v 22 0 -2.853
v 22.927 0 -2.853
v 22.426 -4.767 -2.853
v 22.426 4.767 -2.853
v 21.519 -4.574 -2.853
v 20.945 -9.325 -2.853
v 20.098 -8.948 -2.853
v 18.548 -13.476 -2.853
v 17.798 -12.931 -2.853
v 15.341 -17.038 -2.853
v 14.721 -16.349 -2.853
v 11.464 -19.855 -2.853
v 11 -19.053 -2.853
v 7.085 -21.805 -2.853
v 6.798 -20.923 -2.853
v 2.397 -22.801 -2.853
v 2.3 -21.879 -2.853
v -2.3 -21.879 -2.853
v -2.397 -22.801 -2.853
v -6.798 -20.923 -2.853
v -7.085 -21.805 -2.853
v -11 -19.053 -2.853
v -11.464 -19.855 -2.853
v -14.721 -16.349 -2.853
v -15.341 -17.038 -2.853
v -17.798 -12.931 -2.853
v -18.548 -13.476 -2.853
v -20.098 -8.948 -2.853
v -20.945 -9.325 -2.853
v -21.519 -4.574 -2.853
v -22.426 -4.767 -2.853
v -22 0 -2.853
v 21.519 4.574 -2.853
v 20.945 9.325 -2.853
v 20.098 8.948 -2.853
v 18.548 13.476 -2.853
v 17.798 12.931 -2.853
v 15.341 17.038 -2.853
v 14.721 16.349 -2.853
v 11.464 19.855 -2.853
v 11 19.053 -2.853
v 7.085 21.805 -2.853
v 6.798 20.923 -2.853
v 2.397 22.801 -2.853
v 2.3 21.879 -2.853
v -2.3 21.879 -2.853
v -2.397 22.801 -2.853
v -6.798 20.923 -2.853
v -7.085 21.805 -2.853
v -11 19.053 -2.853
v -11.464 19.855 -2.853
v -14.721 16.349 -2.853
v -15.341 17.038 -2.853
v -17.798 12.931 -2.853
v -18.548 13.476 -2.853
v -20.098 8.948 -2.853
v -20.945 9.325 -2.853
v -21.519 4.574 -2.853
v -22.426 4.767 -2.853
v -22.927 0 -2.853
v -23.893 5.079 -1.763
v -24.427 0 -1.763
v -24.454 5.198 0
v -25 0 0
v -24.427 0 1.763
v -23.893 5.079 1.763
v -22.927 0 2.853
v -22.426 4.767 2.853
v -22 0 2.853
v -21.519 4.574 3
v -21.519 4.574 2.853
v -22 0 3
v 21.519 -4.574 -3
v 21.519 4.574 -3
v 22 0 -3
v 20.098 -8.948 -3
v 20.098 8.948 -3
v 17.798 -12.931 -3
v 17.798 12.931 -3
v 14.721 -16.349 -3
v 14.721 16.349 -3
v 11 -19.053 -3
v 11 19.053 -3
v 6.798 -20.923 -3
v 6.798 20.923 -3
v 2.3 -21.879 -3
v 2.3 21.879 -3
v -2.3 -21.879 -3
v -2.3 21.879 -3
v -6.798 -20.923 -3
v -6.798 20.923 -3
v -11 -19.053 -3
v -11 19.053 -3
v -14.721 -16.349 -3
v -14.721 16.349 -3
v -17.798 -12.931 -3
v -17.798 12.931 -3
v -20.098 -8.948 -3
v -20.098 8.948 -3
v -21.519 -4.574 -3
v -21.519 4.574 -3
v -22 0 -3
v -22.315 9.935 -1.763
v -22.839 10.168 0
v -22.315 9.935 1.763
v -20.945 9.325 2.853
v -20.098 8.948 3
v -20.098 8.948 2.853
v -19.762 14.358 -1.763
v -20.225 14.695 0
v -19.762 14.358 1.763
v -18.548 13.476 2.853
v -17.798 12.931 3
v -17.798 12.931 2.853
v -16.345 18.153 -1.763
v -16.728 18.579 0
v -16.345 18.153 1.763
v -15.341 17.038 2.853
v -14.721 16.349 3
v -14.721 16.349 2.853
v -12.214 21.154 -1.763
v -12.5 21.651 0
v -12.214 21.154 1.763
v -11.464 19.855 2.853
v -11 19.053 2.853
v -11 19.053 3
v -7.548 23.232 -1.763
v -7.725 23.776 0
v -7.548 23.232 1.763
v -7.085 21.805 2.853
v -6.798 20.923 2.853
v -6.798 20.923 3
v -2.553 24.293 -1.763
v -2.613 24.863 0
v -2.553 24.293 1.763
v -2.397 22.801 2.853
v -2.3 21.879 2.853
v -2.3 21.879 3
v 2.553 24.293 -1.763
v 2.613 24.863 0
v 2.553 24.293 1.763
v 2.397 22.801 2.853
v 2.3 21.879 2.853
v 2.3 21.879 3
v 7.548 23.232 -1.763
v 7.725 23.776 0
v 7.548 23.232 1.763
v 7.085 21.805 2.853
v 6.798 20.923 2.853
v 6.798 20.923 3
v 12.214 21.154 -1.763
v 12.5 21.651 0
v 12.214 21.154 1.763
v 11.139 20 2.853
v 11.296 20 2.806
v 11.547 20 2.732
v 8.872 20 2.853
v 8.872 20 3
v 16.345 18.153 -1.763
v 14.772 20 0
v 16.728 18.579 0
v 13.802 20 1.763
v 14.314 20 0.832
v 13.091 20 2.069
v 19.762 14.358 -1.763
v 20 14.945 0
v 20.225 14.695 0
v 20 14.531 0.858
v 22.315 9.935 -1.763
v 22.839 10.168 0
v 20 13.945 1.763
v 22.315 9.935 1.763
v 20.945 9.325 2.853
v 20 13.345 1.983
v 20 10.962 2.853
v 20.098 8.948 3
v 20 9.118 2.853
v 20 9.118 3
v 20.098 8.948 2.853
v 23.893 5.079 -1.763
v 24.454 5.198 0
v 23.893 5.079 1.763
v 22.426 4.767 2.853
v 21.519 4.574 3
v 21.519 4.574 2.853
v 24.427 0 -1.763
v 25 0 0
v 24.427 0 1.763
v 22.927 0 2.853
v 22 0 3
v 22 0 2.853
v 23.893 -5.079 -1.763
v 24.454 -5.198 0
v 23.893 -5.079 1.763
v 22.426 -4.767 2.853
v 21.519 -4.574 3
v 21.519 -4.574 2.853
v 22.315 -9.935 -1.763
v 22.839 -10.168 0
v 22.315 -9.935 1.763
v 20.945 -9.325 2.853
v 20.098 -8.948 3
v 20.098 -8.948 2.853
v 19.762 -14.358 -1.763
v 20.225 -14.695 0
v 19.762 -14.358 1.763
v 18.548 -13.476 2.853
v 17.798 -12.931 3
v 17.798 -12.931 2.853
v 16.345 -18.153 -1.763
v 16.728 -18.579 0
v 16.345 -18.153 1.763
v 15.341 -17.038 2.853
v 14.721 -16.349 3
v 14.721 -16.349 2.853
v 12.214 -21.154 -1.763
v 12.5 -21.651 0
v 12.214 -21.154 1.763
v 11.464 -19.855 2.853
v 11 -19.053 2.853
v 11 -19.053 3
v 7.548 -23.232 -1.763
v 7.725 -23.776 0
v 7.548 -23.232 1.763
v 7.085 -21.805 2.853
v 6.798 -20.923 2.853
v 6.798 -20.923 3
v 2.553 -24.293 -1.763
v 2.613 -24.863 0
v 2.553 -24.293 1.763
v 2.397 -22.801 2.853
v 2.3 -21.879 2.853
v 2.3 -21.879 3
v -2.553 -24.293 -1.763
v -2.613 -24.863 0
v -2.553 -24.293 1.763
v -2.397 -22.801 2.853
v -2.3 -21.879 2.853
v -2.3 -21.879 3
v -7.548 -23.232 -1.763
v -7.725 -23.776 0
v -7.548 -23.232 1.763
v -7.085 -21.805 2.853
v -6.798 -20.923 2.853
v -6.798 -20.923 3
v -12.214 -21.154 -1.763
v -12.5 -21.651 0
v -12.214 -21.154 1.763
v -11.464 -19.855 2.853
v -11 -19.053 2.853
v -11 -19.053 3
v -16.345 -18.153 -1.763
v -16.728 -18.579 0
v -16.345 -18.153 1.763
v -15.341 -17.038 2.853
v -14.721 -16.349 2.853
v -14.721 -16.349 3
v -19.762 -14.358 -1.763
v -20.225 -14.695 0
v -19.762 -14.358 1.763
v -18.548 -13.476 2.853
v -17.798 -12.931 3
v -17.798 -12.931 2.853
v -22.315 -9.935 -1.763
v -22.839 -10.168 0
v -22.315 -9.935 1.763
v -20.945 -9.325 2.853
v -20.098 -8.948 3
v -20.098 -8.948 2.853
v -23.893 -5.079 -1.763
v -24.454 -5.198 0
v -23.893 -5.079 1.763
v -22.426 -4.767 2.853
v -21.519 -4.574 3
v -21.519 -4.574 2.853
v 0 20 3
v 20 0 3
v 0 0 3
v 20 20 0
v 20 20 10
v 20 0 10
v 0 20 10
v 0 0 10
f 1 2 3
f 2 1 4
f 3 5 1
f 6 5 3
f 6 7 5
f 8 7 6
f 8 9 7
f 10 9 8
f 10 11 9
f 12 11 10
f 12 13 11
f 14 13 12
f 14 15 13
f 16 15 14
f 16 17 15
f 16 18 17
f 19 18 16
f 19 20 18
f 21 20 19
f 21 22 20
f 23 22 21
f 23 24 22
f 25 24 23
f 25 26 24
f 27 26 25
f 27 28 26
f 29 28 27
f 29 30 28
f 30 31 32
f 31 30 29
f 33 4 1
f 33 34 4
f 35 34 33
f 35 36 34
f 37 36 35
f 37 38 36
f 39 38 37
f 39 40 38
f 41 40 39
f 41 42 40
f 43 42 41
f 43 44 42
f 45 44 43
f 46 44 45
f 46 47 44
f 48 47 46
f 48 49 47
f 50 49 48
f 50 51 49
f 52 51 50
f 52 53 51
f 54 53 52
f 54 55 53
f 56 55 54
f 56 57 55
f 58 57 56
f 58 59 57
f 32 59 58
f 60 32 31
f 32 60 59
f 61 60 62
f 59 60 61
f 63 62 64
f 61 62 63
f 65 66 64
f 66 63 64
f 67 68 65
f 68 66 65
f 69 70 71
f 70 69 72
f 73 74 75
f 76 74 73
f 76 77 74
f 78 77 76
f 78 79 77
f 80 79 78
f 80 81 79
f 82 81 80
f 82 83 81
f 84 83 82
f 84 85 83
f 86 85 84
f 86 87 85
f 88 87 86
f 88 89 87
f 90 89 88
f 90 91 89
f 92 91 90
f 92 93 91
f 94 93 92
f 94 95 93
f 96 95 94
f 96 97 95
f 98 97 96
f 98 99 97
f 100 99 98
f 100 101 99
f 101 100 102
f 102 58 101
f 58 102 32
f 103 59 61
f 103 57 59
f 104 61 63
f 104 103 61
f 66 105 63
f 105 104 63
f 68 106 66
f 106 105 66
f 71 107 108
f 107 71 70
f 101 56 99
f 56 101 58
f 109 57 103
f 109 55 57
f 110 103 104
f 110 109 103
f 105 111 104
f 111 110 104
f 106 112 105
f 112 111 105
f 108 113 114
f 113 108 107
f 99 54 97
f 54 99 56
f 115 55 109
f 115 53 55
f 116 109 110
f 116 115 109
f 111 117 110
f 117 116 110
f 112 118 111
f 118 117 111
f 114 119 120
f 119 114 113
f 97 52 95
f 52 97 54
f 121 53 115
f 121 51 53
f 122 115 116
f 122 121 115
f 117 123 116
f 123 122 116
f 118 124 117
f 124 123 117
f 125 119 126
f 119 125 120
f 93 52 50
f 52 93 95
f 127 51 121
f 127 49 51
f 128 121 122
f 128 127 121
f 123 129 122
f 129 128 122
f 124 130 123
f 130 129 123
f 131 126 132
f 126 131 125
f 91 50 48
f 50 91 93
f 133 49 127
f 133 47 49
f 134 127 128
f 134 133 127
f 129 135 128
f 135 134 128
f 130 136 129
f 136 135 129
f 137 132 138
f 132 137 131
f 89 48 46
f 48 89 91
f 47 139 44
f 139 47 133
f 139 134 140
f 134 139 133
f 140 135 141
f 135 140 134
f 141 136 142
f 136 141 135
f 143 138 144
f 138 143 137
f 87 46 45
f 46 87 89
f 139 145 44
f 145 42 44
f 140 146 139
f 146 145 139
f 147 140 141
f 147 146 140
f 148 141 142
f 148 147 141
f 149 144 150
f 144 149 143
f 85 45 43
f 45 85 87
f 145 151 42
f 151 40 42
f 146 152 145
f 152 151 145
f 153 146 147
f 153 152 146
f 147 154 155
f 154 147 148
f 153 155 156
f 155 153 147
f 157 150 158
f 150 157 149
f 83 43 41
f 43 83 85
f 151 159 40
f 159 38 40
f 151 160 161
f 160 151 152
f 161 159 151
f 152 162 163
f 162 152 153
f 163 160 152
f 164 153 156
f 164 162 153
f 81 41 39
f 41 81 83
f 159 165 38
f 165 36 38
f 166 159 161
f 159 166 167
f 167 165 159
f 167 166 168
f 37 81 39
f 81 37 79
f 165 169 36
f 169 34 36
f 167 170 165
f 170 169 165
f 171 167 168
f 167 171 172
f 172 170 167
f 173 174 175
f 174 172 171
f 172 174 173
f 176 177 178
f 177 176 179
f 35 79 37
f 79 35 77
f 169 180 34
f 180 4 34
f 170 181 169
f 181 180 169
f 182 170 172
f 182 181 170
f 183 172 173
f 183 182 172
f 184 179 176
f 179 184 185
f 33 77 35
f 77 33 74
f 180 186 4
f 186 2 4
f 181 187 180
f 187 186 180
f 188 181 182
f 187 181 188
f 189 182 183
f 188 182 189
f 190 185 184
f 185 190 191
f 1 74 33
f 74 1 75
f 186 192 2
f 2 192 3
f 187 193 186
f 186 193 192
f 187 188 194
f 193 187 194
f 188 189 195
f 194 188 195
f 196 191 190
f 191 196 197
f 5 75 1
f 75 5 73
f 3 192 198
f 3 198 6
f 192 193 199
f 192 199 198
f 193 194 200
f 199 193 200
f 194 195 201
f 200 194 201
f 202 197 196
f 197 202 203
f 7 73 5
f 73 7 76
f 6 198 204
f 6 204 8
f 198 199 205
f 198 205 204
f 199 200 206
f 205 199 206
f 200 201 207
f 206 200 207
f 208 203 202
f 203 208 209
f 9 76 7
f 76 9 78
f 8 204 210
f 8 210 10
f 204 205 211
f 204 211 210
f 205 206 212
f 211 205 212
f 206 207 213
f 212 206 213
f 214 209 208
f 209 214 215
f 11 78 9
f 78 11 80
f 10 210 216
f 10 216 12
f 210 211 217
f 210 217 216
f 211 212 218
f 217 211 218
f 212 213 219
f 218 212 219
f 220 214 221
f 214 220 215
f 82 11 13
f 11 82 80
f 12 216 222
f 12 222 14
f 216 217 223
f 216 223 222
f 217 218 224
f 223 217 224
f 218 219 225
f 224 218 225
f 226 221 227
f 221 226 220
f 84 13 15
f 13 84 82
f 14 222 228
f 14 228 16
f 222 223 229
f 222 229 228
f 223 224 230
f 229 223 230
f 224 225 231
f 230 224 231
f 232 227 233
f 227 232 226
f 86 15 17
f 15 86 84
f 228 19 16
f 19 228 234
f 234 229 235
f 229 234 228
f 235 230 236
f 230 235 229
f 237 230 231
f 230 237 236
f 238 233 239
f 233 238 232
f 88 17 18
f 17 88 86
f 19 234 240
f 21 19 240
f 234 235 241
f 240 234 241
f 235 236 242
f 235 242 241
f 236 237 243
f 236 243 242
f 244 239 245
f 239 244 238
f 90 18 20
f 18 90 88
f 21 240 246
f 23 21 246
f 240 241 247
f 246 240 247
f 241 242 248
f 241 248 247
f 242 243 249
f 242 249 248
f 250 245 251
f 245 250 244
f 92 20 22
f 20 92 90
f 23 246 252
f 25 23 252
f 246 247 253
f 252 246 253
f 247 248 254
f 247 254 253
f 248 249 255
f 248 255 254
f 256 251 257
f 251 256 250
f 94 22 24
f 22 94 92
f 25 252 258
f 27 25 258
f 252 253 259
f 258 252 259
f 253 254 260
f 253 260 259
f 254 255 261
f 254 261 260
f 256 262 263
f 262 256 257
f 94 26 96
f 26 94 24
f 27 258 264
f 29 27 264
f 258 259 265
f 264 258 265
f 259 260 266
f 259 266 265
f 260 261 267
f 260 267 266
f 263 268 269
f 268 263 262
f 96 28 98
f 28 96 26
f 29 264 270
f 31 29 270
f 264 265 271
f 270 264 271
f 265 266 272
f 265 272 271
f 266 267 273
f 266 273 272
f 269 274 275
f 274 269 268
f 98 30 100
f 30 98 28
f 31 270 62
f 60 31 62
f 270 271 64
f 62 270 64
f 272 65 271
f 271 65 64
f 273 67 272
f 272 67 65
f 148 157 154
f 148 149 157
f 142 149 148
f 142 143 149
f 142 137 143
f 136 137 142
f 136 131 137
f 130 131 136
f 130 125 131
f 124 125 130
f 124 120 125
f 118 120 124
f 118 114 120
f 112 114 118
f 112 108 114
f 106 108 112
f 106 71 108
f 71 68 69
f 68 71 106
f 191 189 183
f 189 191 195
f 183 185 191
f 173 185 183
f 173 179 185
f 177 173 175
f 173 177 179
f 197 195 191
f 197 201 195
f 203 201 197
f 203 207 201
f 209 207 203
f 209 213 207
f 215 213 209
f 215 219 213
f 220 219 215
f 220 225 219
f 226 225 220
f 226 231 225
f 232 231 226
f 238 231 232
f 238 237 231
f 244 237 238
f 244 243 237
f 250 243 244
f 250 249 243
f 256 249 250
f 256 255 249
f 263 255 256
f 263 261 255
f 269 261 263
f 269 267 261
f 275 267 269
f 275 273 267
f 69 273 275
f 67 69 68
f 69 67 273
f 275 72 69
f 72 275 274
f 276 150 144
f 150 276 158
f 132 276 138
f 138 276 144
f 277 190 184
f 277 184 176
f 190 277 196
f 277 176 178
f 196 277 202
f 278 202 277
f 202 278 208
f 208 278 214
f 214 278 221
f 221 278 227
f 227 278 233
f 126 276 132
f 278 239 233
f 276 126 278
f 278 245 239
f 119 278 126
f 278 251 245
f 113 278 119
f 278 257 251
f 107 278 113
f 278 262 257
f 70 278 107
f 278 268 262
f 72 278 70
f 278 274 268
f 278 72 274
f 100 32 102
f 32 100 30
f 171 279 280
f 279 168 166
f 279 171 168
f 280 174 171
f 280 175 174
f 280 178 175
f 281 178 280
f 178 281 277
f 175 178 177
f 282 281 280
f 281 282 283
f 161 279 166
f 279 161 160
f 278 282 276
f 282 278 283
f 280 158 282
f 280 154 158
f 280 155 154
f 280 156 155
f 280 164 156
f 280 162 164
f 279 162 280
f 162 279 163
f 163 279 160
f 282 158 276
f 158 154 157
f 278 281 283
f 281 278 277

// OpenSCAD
// file: vframe.scad
include <configuration.scad>

module vframe(){
    linear_extrude(height=vframe_l)
    polygon(points=[[0,0],[vframe_s,0],[vframe_s,vframe_w],[vframe_w,vframe_w],[vframe_w,vframe_s],[0,vframe_s]]);
}

vframe();
// file: placements.scad
module carriage2vframe()
{
rotate(a=[90,0,-45]) children();
}
// file: configuration.scad
aluminum = [0.9, 0.9, 0.9];

vframe_s=45;
vframe_w=2;
vframe_l=1000;

c_wheel_o_r=3; // wheel outer radius
// carriage inner wheel
c_i_wheel_r=25/2;
// carriage outer wheel
c_o_wheel_r=19/2;
// main file
include <configuration.scad>
include <placements.scad>
use <vframe.scad>

module carriage(){
    cube([20,20,10]);
}

module c_wheel(r){
    rotate_extrude() 
    {
    translate([r-c_wheel_o_r,0,0]) circle(r=c_wheel_o_r);
    translate([0,-c_wheel_o_r,0]) square(size=[r-c_wheel_o_r,2*c_wheel_o_r]);
    }
}
c_wheel(25);
carriage();
//color(aluminum ) vframe(); 
//carriage2vframe() carriage();
